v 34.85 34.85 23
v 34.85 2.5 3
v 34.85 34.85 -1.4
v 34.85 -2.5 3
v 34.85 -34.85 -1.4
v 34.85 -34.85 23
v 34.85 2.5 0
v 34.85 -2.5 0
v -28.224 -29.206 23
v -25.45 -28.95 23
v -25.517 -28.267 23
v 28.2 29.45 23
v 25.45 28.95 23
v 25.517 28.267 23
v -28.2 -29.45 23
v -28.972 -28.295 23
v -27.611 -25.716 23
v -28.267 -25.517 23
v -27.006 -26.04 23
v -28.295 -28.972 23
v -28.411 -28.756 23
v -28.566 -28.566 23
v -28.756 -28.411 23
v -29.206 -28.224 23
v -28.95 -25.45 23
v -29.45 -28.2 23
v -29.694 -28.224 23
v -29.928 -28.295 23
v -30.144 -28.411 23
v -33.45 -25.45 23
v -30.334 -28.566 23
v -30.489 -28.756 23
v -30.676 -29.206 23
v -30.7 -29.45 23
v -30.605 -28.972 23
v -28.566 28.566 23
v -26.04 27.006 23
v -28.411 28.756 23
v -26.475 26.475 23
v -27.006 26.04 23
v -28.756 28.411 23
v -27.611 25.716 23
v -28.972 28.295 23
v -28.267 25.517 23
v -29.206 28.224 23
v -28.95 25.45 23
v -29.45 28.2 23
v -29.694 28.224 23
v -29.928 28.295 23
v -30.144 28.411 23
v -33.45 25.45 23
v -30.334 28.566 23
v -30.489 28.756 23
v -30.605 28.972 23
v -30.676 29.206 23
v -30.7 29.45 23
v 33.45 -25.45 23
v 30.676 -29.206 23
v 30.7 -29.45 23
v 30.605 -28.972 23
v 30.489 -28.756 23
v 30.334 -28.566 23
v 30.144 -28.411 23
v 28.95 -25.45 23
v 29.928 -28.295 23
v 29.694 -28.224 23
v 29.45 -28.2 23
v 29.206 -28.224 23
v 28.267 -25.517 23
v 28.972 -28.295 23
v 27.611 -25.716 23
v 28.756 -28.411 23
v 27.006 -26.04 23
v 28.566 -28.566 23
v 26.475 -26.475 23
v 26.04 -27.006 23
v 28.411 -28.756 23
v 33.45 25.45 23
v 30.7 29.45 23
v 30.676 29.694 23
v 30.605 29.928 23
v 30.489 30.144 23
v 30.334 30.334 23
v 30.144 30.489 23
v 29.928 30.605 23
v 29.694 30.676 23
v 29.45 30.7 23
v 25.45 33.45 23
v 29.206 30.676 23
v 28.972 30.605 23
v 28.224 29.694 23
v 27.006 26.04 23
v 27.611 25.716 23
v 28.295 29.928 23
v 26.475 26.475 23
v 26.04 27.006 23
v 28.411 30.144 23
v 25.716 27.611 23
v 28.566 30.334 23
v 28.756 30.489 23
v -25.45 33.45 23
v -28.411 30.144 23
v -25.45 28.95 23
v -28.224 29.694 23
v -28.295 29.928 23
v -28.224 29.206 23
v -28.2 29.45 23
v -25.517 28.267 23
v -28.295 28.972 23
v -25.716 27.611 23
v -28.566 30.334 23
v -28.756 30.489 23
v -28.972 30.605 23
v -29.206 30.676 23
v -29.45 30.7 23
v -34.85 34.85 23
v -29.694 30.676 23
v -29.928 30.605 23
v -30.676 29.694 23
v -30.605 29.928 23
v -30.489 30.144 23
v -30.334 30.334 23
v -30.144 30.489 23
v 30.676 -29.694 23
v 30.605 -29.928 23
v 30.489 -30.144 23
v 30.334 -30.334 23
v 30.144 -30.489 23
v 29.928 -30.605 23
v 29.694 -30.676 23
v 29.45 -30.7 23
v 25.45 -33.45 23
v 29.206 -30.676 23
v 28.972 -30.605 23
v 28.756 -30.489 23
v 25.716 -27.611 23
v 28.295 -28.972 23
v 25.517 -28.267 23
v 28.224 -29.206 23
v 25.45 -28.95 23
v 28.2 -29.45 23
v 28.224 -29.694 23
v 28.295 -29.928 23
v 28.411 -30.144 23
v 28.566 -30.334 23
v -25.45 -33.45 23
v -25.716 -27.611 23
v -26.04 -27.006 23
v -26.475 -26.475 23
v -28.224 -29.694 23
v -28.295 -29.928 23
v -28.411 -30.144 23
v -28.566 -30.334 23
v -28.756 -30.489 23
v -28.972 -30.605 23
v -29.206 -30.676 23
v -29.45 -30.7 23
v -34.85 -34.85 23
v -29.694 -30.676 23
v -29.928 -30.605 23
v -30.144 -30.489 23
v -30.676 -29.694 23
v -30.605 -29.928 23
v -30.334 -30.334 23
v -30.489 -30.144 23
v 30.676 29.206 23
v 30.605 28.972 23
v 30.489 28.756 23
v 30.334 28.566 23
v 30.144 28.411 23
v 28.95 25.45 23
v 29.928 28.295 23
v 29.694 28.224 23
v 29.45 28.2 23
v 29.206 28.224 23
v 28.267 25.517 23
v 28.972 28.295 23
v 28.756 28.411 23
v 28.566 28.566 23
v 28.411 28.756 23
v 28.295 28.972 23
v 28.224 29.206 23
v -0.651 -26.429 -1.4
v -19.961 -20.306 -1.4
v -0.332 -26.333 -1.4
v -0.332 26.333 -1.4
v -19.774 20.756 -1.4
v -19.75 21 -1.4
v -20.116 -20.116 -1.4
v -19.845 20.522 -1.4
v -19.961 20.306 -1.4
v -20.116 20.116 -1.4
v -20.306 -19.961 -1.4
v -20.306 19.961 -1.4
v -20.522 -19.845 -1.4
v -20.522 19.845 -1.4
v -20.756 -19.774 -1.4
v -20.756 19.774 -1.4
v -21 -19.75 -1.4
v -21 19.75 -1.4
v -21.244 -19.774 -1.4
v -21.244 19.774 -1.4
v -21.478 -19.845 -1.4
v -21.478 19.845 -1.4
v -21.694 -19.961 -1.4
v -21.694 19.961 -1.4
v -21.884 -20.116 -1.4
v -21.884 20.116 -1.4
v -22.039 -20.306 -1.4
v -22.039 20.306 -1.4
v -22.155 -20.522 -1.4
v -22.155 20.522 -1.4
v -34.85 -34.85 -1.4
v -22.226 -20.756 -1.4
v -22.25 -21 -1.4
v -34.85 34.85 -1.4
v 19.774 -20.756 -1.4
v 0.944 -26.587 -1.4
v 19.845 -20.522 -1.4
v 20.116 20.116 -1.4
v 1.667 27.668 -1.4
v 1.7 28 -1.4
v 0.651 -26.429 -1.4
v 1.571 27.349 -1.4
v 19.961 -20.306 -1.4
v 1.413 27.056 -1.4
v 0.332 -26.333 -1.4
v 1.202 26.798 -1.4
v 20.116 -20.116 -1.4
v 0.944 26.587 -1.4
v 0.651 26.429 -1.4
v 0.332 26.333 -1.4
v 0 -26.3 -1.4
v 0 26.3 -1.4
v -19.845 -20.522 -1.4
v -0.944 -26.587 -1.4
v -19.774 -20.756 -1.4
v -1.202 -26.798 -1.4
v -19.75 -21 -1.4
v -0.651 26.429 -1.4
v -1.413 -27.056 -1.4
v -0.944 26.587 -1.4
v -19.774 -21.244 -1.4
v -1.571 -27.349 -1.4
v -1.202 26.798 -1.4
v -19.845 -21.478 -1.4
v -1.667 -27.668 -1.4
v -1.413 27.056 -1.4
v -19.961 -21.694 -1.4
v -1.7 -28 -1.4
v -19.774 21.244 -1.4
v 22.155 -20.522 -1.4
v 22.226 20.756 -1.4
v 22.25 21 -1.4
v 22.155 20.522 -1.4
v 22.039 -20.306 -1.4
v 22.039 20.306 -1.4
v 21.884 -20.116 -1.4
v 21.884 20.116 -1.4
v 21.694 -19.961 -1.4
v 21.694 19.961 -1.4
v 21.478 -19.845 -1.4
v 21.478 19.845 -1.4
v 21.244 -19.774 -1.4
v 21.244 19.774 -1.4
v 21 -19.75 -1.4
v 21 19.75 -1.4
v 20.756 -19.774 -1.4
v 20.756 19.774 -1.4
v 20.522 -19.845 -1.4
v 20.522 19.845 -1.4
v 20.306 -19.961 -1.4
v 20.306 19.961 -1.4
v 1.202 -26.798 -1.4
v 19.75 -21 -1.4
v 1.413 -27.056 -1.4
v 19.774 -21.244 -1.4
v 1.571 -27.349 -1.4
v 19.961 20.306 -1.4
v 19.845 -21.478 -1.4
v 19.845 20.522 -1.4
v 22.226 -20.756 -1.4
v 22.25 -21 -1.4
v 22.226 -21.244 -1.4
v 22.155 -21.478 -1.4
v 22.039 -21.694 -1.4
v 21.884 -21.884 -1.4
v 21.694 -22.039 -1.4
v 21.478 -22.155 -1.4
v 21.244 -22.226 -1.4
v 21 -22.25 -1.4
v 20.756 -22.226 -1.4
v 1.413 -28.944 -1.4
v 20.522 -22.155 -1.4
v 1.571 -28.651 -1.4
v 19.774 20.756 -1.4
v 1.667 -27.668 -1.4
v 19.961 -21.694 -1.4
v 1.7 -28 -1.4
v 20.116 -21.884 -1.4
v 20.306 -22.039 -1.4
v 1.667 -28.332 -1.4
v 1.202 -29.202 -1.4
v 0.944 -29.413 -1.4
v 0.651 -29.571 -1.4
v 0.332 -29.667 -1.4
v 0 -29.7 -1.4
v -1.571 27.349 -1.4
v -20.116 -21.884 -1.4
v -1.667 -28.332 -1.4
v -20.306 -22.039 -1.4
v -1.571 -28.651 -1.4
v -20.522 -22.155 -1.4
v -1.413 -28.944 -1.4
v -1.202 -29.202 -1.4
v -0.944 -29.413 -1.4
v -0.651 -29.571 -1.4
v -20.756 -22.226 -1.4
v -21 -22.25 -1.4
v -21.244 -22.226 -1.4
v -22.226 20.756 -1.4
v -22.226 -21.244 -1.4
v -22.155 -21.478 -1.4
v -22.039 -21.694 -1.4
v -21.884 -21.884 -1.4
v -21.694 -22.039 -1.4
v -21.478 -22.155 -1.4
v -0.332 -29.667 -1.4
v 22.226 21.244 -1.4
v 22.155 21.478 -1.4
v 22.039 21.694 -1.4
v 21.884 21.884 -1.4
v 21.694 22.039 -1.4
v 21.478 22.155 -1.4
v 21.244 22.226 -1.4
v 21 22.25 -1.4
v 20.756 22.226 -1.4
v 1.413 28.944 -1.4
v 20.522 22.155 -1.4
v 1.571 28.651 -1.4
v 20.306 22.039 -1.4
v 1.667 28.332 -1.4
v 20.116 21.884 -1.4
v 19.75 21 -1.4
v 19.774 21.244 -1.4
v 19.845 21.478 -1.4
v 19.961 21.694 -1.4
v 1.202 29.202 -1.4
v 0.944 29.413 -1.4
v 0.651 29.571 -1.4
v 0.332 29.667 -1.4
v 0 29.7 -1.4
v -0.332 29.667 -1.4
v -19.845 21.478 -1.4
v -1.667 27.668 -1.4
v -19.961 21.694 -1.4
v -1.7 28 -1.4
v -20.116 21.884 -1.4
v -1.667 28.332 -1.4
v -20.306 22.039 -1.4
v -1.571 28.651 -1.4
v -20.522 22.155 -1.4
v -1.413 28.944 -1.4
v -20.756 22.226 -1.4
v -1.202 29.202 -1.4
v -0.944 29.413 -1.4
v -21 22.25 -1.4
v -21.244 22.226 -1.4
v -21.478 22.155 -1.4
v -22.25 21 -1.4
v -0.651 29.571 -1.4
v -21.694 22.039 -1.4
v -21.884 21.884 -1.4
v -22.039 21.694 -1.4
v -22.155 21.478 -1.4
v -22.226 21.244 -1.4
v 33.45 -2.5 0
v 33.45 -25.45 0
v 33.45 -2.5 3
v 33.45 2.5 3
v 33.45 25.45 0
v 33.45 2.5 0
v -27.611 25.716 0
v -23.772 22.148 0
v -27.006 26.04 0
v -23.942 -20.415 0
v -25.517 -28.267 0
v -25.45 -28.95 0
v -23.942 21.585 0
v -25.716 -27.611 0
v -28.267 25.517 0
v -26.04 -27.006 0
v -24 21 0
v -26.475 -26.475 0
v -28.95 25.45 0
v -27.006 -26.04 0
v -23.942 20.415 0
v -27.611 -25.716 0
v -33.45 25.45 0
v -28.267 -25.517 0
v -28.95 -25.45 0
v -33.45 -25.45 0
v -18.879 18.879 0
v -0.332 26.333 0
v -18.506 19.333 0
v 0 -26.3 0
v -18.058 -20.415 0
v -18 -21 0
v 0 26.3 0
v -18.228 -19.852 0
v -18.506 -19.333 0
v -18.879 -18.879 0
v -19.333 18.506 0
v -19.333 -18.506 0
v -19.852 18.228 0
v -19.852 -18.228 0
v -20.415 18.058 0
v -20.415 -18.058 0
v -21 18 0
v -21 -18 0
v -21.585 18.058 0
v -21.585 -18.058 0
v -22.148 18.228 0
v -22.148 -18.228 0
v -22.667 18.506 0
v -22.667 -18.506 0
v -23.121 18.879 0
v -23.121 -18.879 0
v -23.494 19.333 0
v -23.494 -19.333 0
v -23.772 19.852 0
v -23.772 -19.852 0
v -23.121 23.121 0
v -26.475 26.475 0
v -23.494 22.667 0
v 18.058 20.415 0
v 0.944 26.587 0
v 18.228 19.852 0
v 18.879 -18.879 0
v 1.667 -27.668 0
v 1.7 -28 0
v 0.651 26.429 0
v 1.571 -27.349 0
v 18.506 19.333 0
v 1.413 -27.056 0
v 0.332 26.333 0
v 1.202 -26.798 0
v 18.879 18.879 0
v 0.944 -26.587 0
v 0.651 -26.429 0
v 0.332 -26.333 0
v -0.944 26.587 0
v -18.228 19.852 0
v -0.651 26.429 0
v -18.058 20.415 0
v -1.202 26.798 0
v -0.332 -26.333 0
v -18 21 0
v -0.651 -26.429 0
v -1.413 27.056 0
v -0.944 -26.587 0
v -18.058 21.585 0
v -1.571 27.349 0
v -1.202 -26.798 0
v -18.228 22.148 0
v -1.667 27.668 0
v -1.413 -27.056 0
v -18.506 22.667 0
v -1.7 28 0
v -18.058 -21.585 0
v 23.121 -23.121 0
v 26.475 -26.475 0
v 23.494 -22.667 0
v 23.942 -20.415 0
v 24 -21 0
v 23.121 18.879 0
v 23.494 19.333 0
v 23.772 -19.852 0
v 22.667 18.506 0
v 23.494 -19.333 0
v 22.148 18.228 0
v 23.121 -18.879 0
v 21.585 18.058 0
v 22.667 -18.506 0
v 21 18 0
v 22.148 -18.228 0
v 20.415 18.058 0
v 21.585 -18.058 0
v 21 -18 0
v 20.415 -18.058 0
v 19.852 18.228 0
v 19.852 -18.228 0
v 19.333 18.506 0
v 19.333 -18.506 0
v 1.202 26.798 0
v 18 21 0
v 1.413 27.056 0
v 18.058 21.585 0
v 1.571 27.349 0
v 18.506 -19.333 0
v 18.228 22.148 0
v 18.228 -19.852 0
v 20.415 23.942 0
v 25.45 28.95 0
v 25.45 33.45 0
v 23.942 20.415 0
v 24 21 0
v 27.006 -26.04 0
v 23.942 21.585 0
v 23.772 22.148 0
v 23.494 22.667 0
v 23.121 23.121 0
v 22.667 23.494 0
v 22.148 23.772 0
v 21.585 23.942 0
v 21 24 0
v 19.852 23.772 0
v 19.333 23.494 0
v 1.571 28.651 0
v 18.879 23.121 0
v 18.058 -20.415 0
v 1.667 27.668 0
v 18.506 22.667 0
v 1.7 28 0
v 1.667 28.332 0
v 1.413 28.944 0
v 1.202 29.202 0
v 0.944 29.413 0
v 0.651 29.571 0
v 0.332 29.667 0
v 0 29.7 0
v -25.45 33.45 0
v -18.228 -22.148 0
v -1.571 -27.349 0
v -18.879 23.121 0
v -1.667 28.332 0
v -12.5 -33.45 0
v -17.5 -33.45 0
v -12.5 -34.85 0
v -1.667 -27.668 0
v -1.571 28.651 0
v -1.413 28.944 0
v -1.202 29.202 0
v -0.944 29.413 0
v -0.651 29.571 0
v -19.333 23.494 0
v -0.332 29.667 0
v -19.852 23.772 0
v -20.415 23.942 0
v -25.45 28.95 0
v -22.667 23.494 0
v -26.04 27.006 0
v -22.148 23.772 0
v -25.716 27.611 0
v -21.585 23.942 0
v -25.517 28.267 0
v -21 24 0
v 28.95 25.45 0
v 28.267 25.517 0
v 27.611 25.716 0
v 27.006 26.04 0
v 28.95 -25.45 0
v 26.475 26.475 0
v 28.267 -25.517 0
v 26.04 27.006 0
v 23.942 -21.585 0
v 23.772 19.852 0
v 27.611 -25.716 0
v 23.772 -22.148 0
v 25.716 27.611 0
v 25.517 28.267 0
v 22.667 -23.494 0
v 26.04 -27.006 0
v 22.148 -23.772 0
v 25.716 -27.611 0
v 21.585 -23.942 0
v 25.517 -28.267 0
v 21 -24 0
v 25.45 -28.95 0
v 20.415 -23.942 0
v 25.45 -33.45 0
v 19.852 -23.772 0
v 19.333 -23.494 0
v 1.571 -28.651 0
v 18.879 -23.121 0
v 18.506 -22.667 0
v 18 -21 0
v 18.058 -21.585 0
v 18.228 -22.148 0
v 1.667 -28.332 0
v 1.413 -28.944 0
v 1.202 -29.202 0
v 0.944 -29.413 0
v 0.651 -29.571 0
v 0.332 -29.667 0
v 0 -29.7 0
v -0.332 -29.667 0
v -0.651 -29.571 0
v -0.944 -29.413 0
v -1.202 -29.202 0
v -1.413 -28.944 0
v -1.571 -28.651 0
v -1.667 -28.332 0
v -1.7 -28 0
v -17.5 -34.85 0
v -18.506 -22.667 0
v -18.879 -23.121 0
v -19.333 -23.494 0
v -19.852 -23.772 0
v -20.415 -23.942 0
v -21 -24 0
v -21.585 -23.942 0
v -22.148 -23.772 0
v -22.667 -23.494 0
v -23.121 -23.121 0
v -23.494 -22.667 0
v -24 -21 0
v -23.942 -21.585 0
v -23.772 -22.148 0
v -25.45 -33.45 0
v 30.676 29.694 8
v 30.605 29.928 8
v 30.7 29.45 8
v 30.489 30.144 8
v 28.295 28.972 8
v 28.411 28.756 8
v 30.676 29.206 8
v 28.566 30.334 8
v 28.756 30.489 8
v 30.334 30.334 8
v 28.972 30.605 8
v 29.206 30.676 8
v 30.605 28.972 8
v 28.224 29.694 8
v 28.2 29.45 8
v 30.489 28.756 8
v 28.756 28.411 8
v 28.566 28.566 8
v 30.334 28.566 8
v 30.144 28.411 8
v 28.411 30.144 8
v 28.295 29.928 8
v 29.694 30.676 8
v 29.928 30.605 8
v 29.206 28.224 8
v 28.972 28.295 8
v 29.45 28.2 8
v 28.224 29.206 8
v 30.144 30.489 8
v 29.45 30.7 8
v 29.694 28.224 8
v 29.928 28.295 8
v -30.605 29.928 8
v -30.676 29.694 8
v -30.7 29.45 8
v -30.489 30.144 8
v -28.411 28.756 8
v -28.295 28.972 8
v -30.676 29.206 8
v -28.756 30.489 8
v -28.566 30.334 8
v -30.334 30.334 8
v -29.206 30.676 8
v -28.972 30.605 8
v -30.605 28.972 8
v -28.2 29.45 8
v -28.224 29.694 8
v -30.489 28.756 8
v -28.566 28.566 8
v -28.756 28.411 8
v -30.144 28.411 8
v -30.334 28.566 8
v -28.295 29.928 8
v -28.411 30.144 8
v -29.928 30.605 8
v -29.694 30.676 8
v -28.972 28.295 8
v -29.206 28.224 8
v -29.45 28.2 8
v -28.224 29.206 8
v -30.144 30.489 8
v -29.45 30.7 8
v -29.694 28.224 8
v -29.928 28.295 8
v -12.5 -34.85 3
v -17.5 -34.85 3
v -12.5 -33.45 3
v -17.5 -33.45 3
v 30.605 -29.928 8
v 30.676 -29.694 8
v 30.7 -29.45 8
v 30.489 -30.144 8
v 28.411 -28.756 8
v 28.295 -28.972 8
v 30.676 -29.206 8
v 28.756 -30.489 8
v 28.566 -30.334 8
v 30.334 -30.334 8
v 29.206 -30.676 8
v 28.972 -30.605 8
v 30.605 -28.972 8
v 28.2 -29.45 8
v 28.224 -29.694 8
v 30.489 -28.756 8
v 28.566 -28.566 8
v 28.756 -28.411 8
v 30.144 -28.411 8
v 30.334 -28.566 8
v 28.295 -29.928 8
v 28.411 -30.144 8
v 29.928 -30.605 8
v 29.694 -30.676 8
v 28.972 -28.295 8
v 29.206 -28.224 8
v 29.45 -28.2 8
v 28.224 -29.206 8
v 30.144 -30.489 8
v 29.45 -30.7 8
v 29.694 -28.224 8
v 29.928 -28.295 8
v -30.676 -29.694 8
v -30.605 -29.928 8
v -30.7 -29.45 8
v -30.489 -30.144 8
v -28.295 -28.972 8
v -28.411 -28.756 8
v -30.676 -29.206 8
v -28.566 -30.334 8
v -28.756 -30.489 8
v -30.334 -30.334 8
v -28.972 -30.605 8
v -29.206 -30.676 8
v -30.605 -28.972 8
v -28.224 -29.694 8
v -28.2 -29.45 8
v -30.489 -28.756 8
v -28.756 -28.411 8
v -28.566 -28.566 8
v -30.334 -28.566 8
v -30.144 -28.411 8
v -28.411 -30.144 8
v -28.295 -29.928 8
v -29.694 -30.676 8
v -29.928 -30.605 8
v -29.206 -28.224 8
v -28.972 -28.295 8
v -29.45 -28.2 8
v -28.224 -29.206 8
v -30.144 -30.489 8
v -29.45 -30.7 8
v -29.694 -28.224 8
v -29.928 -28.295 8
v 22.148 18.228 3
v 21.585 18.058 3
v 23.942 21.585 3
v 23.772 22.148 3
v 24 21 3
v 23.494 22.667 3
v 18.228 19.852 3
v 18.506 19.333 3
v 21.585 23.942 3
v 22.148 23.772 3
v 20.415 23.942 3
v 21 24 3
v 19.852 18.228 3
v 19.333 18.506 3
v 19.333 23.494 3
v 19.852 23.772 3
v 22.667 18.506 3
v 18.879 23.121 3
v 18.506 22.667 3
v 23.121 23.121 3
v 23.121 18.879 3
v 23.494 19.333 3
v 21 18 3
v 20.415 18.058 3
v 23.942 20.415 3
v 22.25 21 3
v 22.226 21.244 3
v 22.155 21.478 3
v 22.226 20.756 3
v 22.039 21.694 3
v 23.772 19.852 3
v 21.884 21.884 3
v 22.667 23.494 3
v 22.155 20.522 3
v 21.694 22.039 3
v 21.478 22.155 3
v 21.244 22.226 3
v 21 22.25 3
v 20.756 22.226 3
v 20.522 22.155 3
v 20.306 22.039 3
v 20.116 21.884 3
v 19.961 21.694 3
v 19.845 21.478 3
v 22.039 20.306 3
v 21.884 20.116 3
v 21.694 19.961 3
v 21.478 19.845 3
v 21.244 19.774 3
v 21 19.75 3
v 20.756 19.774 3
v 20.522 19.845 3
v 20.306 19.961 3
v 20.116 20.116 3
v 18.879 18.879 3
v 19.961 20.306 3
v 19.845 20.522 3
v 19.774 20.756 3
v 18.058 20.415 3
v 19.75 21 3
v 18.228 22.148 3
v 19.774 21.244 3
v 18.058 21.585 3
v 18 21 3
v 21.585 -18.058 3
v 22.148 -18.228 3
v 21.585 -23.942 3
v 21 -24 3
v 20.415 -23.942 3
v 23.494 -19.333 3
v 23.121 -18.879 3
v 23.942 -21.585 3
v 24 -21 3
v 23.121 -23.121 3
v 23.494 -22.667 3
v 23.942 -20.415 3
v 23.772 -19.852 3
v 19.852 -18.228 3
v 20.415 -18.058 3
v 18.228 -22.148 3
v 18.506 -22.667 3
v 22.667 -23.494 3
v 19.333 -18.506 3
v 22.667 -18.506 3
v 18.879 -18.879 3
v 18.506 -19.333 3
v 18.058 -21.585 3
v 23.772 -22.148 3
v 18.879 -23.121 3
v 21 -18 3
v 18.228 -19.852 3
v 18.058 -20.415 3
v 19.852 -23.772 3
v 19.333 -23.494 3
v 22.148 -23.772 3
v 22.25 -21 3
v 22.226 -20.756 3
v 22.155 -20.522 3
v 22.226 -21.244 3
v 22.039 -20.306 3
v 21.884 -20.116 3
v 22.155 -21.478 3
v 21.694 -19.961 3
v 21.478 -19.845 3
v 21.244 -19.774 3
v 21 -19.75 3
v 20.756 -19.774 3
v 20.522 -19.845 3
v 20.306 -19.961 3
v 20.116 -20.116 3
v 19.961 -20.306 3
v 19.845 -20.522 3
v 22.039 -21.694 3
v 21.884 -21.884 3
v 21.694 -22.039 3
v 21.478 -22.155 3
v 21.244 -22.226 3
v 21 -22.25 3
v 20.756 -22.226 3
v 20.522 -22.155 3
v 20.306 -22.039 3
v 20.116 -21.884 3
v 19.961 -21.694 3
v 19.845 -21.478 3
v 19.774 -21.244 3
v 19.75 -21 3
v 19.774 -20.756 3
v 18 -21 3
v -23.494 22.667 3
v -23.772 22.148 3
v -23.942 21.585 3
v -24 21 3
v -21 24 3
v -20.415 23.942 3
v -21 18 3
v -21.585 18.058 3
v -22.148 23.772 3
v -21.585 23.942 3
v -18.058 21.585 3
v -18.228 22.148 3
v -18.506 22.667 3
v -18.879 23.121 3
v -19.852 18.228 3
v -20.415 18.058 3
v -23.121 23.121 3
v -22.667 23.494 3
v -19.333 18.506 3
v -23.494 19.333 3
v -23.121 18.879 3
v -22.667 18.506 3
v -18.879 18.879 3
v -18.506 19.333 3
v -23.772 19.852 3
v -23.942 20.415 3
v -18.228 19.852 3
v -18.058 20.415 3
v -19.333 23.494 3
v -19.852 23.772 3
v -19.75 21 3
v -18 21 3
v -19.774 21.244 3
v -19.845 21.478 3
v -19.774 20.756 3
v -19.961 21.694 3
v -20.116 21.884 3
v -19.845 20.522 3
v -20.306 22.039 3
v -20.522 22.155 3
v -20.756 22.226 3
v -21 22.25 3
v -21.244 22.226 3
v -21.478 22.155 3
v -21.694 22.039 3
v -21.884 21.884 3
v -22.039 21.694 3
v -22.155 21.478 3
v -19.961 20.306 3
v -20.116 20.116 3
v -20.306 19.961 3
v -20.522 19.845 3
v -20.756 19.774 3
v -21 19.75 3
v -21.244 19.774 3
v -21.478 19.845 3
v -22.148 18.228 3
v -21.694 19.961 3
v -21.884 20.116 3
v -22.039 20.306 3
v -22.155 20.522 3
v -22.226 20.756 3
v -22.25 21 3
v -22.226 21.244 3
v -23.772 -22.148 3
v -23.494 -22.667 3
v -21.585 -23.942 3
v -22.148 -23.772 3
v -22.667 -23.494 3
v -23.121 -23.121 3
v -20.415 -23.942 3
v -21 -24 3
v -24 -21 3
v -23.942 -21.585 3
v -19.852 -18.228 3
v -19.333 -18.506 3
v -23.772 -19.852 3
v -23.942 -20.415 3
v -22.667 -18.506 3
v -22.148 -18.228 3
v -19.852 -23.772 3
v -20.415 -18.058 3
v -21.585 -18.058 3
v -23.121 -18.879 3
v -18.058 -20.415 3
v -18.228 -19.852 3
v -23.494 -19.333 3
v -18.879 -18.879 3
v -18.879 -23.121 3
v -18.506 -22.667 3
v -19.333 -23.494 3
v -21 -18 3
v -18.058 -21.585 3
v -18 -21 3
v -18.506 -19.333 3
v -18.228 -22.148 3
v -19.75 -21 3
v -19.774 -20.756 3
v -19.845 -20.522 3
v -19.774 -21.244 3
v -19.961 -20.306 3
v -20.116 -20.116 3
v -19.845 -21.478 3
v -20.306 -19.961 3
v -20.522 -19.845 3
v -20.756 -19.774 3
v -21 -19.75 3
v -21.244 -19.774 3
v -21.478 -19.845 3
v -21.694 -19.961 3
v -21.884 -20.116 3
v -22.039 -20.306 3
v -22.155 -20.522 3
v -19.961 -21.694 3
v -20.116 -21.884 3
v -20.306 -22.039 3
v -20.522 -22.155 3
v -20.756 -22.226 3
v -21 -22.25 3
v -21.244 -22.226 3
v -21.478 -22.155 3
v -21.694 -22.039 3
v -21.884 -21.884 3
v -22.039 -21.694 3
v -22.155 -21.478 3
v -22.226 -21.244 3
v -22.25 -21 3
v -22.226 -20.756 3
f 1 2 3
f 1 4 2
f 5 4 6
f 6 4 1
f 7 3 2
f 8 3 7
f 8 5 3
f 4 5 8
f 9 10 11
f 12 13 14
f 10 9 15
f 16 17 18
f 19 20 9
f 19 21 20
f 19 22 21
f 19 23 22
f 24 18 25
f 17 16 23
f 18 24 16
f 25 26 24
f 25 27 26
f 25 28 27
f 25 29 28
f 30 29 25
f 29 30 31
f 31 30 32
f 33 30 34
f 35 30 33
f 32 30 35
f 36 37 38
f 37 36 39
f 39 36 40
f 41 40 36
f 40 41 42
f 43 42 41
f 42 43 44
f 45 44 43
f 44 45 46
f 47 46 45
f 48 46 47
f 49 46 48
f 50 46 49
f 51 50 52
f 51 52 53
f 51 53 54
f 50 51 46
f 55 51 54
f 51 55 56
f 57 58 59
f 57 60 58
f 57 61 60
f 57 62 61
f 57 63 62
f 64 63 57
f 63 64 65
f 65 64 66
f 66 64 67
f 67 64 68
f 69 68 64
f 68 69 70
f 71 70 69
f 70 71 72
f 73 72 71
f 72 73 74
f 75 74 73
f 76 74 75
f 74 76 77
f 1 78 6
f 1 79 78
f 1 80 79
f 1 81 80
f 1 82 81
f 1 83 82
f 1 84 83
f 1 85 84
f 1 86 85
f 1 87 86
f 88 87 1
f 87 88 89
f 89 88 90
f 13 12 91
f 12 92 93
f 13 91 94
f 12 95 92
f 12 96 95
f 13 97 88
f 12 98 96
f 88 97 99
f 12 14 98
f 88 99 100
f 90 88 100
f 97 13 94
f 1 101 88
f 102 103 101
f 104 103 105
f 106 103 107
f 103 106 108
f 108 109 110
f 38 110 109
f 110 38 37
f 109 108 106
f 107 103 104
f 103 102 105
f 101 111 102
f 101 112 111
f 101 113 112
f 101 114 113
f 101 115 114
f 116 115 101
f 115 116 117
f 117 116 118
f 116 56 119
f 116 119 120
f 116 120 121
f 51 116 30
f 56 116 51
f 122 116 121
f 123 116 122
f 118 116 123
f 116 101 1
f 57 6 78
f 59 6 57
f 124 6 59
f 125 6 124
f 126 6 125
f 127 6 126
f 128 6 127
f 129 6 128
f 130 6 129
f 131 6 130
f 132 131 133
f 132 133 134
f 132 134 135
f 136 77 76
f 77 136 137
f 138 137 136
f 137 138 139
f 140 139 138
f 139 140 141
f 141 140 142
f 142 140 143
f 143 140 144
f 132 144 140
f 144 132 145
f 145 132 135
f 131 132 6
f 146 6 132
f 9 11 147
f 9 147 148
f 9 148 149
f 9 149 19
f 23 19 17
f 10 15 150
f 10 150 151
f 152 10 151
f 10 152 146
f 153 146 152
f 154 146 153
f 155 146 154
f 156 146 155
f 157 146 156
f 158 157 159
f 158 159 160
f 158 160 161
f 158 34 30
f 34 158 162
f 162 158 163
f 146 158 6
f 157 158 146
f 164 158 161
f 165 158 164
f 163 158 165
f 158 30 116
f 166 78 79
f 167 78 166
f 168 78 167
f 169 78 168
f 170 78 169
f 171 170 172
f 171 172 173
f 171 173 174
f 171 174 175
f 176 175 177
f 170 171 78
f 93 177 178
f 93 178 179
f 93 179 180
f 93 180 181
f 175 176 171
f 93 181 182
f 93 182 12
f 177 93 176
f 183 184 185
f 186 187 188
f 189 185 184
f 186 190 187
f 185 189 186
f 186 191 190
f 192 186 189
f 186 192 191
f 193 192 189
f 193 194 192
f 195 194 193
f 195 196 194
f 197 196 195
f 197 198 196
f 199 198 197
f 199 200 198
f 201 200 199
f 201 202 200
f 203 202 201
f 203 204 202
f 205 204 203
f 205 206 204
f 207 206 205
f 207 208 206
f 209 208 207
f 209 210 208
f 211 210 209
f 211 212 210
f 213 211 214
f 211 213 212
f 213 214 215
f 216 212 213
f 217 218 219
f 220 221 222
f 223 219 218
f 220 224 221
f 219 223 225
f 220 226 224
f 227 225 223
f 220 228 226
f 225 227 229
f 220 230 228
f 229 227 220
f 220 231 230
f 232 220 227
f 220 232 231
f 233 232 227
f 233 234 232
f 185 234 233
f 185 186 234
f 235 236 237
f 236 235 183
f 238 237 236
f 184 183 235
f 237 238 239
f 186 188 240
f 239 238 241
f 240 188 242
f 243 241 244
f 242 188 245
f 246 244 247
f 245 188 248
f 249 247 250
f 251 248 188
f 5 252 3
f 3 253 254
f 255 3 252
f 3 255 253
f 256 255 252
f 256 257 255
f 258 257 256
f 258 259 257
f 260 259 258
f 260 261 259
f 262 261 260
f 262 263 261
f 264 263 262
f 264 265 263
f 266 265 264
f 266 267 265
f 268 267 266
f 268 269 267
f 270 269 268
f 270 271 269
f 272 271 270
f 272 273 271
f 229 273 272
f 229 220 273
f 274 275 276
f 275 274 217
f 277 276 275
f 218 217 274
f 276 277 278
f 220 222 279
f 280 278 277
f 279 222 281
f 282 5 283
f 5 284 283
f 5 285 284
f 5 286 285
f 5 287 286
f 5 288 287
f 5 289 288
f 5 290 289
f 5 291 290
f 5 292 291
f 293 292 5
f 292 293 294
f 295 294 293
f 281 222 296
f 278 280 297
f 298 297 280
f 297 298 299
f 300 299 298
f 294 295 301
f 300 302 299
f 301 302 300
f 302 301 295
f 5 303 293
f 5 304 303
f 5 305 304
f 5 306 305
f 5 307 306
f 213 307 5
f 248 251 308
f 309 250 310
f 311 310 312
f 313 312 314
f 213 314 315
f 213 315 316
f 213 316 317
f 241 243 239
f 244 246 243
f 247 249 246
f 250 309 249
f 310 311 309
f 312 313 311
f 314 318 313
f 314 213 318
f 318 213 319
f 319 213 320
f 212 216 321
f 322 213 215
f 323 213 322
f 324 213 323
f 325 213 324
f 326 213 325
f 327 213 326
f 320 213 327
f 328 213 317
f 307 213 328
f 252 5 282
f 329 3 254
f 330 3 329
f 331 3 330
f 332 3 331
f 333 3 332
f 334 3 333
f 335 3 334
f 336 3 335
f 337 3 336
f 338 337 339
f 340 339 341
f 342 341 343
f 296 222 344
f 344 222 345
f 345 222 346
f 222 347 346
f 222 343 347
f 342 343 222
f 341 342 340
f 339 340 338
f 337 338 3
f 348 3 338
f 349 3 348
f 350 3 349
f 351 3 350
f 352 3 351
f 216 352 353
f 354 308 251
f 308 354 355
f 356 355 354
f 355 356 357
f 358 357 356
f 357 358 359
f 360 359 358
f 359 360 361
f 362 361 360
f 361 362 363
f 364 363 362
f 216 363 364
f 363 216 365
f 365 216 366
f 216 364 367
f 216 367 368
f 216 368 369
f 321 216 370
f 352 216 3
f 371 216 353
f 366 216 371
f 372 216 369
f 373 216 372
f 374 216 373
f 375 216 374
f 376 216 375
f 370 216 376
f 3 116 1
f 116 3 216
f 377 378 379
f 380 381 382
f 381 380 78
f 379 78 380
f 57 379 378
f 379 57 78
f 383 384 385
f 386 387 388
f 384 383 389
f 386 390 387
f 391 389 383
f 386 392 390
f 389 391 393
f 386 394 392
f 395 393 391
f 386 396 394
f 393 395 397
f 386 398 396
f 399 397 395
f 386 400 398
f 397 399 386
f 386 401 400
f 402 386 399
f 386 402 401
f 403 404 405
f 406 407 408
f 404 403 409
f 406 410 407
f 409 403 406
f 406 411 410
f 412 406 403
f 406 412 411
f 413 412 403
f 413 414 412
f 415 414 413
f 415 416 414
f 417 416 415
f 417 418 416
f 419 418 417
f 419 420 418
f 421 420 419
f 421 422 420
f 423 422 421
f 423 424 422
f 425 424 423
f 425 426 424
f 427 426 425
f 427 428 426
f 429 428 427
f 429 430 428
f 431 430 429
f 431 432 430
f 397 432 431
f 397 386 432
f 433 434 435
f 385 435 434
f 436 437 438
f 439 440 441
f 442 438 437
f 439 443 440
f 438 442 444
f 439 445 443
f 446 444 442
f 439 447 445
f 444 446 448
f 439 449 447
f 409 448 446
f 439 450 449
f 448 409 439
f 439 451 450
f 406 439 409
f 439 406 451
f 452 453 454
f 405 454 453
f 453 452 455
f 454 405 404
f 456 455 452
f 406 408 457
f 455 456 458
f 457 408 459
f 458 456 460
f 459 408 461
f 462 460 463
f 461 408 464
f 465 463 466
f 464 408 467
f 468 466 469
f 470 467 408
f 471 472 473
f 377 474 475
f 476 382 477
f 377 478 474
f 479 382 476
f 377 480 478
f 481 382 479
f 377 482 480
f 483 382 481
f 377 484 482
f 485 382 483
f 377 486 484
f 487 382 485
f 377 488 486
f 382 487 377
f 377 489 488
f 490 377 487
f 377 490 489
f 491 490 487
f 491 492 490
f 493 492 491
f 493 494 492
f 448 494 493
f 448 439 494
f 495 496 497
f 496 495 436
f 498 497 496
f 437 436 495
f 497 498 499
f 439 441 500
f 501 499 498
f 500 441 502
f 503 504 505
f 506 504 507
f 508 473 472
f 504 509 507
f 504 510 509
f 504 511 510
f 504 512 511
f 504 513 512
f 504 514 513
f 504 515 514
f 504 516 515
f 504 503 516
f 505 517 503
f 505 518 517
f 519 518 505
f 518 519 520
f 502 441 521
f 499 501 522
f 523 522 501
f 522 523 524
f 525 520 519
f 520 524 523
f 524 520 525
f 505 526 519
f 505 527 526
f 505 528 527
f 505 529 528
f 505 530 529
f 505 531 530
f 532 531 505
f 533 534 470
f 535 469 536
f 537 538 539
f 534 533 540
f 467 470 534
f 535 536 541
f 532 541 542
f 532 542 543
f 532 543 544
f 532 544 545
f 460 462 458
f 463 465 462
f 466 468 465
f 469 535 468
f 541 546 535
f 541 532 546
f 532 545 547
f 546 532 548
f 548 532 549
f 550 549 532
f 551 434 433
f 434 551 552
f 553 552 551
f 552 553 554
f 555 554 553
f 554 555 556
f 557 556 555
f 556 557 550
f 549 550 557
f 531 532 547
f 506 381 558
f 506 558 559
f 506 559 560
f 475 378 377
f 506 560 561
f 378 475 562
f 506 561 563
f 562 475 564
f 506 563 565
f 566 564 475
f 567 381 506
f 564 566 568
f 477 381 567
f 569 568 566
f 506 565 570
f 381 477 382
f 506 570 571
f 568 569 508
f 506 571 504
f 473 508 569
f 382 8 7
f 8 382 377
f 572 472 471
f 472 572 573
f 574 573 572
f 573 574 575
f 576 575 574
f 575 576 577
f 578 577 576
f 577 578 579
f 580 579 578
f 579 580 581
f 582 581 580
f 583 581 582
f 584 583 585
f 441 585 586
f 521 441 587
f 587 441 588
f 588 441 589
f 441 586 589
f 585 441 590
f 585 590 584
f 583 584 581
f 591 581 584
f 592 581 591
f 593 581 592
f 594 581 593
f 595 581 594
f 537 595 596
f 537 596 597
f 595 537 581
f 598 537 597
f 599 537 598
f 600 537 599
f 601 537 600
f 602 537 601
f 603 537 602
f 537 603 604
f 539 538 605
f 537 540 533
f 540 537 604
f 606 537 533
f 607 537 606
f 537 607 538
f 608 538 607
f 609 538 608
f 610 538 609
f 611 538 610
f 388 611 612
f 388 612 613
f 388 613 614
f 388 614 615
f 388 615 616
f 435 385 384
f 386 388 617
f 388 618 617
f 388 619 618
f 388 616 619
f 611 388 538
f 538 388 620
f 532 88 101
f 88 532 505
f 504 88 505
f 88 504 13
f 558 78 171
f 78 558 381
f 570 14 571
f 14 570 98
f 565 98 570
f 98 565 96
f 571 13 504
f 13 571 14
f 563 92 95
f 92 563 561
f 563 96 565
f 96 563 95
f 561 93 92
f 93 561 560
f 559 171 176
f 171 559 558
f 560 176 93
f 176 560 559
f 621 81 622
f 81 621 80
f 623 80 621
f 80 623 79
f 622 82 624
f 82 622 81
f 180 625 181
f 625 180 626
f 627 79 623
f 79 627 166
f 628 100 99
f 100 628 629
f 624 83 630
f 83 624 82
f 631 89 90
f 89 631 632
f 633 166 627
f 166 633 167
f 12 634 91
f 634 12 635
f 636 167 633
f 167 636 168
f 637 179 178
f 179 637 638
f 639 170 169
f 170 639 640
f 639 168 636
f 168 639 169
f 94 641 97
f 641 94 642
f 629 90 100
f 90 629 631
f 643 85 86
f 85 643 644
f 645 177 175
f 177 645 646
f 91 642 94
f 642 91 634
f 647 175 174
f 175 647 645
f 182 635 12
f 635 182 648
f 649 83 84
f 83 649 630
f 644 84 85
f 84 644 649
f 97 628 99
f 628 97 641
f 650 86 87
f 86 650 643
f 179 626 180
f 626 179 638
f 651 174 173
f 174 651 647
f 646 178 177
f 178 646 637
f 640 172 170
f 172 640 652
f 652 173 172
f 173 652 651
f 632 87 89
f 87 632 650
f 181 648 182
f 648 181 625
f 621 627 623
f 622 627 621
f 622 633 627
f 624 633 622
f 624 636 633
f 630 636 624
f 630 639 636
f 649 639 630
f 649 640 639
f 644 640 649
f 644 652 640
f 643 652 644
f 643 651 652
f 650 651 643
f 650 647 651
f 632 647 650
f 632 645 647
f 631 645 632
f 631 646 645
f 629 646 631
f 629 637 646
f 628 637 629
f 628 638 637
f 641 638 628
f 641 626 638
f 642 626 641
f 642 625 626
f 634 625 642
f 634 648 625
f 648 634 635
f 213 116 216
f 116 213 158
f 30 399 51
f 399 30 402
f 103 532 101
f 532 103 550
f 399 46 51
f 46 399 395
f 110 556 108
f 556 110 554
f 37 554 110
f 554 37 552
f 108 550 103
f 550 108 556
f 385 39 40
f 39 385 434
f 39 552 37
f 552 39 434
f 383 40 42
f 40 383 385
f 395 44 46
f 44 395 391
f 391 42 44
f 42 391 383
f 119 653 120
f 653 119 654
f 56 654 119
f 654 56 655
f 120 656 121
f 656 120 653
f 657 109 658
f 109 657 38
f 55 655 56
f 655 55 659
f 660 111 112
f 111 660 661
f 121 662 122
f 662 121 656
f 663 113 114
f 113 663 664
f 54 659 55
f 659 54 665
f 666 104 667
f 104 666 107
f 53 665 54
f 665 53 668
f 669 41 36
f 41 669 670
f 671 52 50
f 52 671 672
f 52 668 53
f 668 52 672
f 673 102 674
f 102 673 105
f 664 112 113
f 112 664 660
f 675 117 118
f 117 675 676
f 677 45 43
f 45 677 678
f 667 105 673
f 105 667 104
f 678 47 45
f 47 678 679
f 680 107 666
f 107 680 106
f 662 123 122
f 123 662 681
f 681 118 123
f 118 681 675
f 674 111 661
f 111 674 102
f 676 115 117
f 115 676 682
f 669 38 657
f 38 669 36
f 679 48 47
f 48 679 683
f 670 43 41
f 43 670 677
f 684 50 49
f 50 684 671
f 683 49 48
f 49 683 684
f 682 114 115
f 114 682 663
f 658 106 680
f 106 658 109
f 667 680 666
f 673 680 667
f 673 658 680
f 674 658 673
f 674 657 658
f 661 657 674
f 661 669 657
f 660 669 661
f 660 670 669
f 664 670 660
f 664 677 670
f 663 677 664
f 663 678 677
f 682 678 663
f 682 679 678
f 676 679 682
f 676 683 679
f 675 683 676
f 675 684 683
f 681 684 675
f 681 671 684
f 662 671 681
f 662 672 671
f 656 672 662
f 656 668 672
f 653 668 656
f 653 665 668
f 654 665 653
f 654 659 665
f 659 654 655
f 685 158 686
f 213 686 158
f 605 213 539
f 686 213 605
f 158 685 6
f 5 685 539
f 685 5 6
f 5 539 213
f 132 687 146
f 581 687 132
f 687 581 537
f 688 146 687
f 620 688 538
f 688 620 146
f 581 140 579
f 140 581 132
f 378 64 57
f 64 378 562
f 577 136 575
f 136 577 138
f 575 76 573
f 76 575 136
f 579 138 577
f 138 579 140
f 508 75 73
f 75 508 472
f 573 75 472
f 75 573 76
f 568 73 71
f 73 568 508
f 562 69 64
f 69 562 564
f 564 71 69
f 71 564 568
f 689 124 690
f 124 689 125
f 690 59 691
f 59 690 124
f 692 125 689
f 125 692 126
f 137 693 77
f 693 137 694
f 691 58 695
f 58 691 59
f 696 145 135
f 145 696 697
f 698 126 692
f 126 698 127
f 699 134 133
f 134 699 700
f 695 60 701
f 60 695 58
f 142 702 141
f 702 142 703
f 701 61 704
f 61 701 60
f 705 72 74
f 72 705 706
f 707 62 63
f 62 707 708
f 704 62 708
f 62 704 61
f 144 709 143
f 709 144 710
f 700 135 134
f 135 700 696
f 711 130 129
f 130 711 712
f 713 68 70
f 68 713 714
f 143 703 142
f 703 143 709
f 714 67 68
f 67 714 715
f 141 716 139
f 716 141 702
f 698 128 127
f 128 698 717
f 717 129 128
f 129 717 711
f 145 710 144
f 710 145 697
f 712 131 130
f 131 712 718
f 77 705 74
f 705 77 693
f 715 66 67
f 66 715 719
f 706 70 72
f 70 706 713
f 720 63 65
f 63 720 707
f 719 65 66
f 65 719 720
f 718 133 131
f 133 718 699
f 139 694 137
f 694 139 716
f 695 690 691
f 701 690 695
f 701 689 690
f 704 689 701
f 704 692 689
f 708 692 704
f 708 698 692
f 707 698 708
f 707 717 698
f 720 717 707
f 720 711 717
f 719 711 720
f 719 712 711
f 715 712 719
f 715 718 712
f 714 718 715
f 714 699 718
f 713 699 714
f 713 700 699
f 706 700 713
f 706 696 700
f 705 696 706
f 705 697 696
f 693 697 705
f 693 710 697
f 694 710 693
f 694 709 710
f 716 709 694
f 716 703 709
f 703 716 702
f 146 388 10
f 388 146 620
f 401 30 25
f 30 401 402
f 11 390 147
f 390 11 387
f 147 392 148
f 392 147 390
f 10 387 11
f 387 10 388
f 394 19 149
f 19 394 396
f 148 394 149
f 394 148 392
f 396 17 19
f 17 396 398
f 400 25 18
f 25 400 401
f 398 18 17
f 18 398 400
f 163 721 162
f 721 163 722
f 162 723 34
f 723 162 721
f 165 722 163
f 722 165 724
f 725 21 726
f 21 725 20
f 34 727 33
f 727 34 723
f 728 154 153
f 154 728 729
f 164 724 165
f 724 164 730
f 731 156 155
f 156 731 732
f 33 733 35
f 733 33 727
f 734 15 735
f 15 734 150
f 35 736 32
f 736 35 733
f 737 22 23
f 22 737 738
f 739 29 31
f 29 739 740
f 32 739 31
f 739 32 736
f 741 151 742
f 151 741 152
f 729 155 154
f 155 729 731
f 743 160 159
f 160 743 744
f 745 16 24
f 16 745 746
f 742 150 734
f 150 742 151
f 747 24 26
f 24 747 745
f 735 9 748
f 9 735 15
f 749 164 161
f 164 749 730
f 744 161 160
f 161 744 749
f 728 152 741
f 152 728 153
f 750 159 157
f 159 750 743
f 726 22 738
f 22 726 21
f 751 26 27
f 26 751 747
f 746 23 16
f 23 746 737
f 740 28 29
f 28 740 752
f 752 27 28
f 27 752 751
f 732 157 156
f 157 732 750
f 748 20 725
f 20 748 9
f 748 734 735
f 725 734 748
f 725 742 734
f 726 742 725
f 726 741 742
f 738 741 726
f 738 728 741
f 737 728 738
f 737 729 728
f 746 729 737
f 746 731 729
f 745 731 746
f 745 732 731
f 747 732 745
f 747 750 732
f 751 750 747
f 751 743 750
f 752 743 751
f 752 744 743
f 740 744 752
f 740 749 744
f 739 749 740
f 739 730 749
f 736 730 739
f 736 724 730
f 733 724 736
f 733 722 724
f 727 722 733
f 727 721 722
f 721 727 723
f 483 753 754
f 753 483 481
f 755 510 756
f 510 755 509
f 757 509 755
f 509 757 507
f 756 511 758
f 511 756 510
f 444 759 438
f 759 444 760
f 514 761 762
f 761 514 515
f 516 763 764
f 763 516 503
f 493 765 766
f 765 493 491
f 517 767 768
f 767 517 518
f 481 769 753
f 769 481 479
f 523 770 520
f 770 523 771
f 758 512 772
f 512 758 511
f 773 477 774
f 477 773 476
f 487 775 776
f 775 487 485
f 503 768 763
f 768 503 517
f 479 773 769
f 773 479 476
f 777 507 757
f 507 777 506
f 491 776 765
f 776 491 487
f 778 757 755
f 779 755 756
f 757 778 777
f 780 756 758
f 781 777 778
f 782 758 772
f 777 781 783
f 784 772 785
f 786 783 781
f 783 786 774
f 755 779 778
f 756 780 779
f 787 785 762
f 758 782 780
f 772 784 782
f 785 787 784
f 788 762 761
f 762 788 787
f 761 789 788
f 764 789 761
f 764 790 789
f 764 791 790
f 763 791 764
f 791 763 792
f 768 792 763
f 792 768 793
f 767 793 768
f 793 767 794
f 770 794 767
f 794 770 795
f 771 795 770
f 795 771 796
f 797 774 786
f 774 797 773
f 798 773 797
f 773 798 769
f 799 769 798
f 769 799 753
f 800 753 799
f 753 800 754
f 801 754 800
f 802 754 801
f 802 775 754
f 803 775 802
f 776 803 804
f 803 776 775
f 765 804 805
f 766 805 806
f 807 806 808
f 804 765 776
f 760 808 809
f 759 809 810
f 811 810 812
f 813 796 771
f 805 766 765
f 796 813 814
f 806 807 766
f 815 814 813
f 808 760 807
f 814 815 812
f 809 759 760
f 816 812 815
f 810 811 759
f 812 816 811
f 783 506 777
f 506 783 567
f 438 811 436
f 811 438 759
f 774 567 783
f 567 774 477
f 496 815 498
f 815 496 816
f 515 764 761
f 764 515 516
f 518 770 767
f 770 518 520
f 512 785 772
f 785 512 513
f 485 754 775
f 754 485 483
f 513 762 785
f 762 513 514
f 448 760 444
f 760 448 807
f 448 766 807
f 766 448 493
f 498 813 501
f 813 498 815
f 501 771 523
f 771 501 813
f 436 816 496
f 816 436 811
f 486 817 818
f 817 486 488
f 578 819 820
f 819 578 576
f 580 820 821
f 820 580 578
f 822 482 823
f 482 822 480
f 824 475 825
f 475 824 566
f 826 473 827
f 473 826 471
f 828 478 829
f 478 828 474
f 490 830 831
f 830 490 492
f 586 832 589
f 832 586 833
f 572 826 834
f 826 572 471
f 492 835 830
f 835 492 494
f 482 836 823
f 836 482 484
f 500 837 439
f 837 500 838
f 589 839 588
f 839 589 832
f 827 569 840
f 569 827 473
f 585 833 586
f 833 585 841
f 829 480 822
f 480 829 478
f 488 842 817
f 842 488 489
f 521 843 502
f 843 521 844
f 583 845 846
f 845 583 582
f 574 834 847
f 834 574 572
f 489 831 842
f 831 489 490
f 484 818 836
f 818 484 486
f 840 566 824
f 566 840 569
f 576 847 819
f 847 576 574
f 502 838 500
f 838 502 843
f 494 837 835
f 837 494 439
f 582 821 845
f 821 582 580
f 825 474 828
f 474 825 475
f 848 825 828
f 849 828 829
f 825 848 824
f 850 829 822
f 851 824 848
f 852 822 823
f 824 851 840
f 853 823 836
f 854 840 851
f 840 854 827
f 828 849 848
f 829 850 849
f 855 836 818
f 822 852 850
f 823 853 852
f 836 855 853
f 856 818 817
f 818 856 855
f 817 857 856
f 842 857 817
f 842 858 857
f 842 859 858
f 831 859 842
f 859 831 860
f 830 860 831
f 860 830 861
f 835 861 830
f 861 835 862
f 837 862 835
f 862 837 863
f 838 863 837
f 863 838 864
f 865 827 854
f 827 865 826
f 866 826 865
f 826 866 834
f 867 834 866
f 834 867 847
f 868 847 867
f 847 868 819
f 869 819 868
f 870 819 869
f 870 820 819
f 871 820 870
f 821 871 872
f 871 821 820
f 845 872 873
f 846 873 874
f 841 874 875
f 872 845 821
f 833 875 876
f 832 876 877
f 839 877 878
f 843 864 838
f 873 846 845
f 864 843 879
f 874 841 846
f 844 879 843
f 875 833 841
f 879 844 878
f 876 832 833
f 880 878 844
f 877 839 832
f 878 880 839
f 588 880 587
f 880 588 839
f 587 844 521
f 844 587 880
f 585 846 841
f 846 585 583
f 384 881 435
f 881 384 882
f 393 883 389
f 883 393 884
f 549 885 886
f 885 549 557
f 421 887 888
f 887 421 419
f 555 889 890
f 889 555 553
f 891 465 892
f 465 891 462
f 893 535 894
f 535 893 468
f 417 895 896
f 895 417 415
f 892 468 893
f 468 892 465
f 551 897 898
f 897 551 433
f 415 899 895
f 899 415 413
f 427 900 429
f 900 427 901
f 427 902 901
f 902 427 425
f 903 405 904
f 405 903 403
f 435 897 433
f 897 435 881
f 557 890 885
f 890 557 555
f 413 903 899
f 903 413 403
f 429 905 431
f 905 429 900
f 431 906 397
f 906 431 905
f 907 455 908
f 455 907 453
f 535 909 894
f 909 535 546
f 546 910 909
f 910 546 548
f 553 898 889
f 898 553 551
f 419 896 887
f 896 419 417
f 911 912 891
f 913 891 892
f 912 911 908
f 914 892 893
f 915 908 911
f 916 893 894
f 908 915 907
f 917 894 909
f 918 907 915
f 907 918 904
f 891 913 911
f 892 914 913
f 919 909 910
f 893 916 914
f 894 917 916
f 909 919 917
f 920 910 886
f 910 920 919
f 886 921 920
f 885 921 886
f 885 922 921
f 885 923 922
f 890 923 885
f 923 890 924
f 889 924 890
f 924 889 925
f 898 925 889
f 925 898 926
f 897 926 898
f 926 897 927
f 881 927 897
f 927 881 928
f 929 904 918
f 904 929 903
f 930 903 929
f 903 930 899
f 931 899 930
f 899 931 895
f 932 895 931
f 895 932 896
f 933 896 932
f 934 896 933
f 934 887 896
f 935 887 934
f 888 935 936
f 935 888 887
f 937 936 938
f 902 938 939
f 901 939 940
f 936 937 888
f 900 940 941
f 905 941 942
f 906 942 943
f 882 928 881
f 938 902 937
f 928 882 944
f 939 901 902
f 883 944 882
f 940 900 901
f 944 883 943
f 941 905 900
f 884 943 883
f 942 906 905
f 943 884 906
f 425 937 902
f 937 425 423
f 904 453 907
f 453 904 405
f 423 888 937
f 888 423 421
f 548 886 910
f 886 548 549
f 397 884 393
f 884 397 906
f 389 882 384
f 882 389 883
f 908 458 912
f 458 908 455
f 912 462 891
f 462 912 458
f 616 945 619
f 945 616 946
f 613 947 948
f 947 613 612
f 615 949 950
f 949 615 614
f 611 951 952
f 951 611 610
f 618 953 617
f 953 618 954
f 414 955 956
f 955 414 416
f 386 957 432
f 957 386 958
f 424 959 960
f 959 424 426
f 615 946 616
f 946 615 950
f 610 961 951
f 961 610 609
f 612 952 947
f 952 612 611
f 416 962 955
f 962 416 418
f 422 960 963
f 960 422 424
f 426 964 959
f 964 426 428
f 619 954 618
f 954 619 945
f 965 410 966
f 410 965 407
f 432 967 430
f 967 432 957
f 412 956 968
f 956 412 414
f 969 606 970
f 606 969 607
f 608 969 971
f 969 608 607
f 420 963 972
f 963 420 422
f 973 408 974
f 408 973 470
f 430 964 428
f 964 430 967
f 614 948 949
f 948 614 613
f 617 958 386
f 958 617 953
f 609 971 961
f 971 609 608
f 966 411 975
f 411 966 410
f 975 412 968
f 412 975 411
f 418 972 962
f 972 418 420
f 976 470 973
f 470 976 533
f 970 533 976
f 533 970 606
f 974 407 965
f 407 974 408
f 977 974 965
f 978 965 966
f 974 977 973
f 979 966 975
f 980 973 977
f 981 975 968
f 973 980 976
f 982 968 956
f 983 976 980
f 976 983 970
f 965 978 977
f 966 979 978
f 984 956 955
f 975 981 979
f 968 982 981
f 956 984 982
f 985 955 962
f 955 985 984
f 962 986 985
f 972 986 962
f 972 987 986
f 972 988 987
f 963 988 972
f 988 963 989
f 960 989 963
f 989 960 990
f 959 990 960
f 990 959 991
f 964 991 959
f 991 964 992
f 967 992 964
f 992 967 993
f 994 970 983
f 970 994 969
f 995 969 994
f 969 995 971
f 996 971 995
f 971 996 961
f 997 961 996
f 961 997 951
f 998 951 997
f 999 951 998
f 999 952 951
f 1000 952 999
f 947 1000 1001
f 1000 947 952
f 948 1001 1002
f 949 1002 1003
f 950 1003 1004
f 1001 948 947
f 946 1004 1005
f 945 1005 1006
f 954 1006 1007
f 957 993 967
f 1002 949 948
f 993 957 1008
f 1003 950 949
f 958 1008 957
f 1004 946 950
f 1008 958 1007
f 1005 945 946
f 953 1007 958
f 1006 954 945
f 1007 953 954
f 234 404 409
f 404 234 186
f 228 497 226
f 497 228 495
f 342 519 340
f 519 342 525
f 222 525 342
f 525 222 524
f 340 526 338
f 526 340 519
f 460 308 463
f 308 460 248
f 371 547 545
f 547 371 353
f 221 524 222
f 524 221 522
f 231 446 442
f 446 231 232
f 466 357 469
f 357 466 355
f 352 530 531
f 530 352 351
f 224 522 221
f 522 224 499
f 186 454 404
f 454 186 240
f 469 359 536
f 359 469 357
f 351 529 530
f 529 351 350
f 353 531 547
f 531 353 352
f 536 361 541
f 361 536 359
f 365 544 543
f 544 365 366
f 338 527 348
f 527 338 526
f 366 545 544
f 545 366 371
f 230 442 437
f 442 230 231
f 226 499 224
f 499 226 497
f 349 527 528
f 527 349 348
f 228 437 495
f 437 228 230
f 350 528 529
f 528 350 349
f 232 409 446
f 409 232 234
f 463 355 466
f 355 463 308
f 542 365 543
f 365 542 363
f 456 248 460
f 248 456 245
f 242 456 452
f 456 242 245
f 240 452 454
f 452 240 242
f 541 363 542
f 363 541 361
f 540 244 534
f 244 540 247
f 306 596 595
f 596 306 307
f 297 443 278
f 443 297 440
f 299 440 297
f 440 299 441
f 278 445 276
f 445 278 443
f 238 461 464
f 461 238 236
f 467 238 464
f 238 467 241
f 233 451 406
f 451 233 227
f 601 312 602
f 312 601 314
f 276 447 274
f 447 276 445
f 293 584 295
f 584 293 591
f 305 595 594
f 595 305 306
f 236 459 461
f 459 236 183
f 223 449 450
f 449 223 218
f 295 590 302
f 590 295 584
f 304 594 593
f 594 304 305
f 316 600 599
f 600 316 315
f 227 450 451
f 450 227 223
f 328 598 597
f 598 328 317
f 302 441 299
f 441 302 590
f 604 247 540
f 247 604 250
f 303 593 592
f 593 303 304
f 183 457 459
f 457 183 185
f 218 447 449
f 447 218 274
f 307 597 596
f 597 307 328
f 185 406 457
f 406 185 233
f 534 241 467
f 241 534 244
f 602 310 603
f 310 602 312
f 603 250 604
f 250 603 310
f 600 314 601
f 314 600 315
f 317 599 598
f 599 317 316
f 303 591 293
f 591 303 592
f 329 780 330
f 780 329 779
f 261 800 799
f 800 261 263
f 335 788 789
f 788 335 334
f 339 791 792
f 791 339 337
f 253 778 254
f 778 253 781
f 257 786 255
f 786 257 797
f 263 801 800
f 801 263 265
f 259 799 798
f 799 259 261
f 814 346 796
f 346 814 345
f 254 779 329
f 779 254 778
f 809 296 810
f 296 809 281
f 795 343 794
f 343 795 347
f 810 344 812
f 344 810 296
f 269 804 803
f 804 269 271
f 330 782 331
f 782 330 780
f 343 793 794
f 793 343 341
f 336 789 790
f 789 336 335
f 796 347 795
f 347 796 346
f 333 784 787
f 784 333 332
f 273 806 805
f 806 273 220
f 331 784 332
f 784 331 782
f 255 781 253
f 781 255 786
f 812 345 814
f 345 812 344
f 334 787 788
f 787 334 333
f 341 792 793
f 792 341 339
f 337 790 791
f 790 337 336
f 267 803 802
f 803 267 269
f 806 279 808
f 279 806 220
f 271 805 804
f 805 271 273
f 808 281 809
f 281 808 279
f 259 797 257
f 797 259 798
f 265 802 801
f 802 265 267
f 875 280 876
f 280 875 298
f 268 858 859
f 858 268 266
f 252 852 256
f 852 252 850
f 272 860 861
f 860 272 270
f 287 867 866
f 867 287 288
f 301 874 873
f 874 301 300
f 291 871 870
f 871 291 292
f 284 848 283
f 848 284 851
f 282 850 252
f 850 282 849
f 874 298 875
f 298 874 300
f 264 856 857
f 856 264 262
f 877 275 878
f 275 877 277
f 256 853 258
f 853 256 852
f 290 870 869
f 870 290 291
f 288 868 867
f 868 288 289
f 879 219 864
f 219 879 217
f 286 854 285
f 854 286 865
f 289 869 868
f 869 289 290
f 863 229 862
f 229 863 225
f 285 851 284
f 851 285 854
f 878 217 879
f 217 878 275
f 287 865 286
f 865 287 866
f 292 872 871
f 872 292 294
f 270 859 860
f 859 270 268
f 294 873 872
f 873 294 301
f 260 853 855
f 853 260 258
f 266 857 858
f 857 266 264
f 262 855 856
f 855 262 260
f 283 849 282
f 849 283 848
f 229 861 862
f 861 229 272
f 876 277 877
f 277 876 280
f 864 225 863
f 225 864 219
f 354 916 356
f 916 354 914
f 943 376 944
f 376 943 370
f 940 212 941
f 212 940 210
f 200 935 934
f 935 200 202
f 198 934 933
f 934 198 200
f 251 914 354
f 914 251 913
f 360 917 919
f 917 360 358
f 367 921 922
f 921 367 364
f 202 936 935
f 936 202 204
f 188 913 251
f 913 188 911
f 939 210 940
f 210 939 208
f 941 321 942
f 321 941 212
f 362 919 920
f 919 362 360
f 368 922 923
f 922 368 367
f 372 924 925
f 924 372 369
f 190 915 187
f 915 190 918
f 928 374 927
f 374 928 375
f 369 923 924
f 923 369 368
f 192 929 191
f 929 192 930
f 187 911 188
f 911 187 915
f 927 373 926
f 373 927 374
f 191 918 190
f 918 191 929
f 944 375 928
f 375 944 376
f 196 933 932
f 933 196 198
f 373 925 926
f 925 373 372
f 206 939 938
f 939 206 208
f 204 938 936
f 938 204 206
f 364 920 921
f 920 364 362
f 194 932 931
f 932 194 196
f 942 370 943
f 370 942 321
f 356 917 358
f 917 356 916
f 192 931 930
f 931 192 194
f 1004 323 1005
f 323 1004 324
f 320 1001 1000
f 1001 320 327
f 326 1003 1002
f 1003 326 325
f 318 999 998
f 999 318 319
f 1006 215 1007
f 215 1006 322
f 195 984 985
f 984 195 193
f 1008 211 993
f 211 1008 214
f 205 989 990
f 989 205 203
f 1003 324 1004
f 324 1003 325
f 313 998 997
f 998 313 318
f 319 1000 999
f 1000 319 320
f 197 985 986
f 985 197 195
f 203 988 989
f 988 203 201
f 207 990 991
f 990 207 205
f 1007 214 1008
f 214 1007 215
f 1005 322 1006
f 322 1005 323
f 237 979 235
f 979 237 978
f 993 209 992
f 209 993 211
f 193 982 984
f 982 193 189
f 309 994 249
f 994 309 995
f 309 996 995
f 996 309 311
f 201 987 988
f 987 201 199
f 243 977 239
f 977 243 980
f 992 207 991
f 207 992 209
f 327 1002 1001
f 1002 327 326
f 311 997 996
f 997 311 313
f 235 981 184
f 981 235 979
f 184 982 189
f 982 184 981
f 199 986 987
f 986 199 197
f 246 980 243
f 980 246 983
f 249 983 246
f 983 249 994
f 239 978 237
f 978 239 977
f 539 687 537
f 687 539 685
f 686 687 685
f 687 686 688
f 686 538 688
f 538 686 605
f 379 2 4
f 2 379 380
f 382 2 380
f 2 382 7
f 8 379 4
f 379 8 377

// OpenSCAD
// file: door-case-params.scad
/*	
	k4cg door-status
	Copyright (C) 2017  Christian Carlowitz <chca@cmesh.de>

	This program is free software: you can redistribute it and/or modify
	it under the terms of the GNU General Public License as published by
	the Free Software Foundation, either version 3 of the License, or
	(at your option) any later version.

	This program is distributed in the hope that it will be useful,
	but WITHOUT ANY WARRANTY; without even the implied warranty of
	MERCHANTABILITY or FITNESS FOR A PARTICULAR PURPOSE.  See the
	GNU General Public License for more details.

	You should have received a copy of the GNU General Public License
	along with this program.  If not, see <http://www.gnu.org/licenses/>.
*/

eps = 0.1;
$fn=32;

boardGap = 1;
boardX = 65+eps; // PCB width
boardY = 65+eps; // PCB depth
boardZ = 0; // PCB height
addZ = 23; // additional Y height until top part begins
wall = 1.4; // casing wall thickness
wallInsetW = 0;
wallInsetH = 0;
wallInsetOff = 0.2;

bottomHeight = 1.4;

mountR = 3;
mountW = 7;
mountHeight = boardZ+addZ;
mountDrill = 2.5;
mountHole = 3;

screwSinkH = 2.5;
screwSinkD = 6.5;

// top plate
topHeight = 3.5;
// main file
/*	
	k4cg door-status
	Copyright (C) 2017  Christian Carlowitz <chca@cmesh.de>

	This program is free software: you can redistribute it and/or modify
	it under the terms of the GNU General Public License as published by
	the Free Software Foundation, either version 3 of the License, or
	(at your option) any later version.

	This program is distributed in the hope that it will be useful,
	but WITHOUT ANY WARRANTY; without even the implied warranty of
	MERCHANTABILITY or FITNESS FOR A PARTICULAR PURPOSE.  See the
	GNU General Public License for more details.

	You should have received a copy of the GNU General Public License
	along with this program.  If not, see <http://www.gnu.org/licenses/>.
*/

// *** all dimensions in mm ***

include <door-case-params.scad>

module shell(w,bh,x,y,z,winw,winh)
{
	difference()
	{
		union()
		{
			translate([0,0,-bh])
				cube([w+x, w+y, z+bh]); // outer volume
			cube([x+winw,y+winw,z+winh]);
		}
		translate([-eps,-eps,0])
			cube([x+eps,y+eps,z+eps+winh]); // inner volume
	}
}

module mount(w,r,h,off)
{
	union()
	{
		translate([0,0,-eps])
		linear_extrude(height=h+eps)
		polygon(points=[[off+eps,off+eps],[-w,off+eps],
			[-w,-w/2],[-w/2,-w],[off+eps,-w] ]);
		
		translate([-w/2,-w/2,-eps])
		cylinder(h=h+eps, r=w/2);
	}
}

module mountr(x,y,r,h)
{
	translate([x,y,-eps])
	cylinder(h=h+eps, r=r);
}

module case()
{
	difference()
	{
		union()
		{
			// outer case shell
			shell(wall, bottomHeight, boardX/2+boardGap, boardY/2+boardGap, boardZ+addZ,
				wallInsetW, wallInsetH);

			// pc mount feature
			translate([boardX/2, boardY/2, 0])
			{
				mount(mountW, mountR, mountHeight, boardGap, mountDrill);
			}
		}

		translate([boardX/2, boardY/2])
		translate([-mountR,-mountR,addZ-15])
		{
			// screw drill
			cylinder(h=(15+2*eps), r=mountDrill/2);
		}
	}
}

module cut(x,y,w,h)
{
	translate([x-w/2,y-h/2,-bottomHeight-eps])
	cube([w,h,bottomHeight+2*eps]);
}

module cutr(x,y,r,hadd=0)
{
    translate([x,y,-bottomHeight-eps])
    cylinder(h=bottomHeight+2*eps+hadd, r=r);
}

module cutWall(x,y,w,d,h)
{
	translate([x-w/2,y-d/2,0])
	cube([w,d,h]);
}

union()
{
	difference()
	{
		union()
		{
			translate([-eps,-eps,0])
			case();

			mirror([-1,0,0])
			translate([-eps,-eps,0])
			case();

			mirror([0,-1,0])
			translate([-eps,-eps,0])
			case();

			mirror([0,-1,0])
			mirror([-1,0,0])
			translate([-eps,-eps,0])
			case();

			mountr(21,21,3,3);

			mirror([0,-1,0])
			mountr(21,21,3,3);
			
			mirror([-1,0,0])
			mountr(21,21,3,3);

			mirror([0,-1,0])
			mirror([-1,0,0])
			mountr(21,21,3,3);

		}

		cutr(0,28,3.4/2);
		cutr(0,-28,3.4/2);
		
		cutr(21,21,2.5/2,hadd=10);
		mirror([0,-1,0])
		cutr(21,21,2.5/2,hadd=10);
		mirror([-1,0,0])
		cutr(21,21,2.5/2,hadd=10);
		mirror([0,-1,0])
		mirror([-1,0,0])
		cutr(21,21,2.5/2,hadd=10);
		
		cutWall(-15,-boardY/2,5,10,3);
		cutWall(boardX/2,0,10,5,3);
		
	}
}

//translate([0,0,boardZ+addZ]) import("test1-top.stl");
